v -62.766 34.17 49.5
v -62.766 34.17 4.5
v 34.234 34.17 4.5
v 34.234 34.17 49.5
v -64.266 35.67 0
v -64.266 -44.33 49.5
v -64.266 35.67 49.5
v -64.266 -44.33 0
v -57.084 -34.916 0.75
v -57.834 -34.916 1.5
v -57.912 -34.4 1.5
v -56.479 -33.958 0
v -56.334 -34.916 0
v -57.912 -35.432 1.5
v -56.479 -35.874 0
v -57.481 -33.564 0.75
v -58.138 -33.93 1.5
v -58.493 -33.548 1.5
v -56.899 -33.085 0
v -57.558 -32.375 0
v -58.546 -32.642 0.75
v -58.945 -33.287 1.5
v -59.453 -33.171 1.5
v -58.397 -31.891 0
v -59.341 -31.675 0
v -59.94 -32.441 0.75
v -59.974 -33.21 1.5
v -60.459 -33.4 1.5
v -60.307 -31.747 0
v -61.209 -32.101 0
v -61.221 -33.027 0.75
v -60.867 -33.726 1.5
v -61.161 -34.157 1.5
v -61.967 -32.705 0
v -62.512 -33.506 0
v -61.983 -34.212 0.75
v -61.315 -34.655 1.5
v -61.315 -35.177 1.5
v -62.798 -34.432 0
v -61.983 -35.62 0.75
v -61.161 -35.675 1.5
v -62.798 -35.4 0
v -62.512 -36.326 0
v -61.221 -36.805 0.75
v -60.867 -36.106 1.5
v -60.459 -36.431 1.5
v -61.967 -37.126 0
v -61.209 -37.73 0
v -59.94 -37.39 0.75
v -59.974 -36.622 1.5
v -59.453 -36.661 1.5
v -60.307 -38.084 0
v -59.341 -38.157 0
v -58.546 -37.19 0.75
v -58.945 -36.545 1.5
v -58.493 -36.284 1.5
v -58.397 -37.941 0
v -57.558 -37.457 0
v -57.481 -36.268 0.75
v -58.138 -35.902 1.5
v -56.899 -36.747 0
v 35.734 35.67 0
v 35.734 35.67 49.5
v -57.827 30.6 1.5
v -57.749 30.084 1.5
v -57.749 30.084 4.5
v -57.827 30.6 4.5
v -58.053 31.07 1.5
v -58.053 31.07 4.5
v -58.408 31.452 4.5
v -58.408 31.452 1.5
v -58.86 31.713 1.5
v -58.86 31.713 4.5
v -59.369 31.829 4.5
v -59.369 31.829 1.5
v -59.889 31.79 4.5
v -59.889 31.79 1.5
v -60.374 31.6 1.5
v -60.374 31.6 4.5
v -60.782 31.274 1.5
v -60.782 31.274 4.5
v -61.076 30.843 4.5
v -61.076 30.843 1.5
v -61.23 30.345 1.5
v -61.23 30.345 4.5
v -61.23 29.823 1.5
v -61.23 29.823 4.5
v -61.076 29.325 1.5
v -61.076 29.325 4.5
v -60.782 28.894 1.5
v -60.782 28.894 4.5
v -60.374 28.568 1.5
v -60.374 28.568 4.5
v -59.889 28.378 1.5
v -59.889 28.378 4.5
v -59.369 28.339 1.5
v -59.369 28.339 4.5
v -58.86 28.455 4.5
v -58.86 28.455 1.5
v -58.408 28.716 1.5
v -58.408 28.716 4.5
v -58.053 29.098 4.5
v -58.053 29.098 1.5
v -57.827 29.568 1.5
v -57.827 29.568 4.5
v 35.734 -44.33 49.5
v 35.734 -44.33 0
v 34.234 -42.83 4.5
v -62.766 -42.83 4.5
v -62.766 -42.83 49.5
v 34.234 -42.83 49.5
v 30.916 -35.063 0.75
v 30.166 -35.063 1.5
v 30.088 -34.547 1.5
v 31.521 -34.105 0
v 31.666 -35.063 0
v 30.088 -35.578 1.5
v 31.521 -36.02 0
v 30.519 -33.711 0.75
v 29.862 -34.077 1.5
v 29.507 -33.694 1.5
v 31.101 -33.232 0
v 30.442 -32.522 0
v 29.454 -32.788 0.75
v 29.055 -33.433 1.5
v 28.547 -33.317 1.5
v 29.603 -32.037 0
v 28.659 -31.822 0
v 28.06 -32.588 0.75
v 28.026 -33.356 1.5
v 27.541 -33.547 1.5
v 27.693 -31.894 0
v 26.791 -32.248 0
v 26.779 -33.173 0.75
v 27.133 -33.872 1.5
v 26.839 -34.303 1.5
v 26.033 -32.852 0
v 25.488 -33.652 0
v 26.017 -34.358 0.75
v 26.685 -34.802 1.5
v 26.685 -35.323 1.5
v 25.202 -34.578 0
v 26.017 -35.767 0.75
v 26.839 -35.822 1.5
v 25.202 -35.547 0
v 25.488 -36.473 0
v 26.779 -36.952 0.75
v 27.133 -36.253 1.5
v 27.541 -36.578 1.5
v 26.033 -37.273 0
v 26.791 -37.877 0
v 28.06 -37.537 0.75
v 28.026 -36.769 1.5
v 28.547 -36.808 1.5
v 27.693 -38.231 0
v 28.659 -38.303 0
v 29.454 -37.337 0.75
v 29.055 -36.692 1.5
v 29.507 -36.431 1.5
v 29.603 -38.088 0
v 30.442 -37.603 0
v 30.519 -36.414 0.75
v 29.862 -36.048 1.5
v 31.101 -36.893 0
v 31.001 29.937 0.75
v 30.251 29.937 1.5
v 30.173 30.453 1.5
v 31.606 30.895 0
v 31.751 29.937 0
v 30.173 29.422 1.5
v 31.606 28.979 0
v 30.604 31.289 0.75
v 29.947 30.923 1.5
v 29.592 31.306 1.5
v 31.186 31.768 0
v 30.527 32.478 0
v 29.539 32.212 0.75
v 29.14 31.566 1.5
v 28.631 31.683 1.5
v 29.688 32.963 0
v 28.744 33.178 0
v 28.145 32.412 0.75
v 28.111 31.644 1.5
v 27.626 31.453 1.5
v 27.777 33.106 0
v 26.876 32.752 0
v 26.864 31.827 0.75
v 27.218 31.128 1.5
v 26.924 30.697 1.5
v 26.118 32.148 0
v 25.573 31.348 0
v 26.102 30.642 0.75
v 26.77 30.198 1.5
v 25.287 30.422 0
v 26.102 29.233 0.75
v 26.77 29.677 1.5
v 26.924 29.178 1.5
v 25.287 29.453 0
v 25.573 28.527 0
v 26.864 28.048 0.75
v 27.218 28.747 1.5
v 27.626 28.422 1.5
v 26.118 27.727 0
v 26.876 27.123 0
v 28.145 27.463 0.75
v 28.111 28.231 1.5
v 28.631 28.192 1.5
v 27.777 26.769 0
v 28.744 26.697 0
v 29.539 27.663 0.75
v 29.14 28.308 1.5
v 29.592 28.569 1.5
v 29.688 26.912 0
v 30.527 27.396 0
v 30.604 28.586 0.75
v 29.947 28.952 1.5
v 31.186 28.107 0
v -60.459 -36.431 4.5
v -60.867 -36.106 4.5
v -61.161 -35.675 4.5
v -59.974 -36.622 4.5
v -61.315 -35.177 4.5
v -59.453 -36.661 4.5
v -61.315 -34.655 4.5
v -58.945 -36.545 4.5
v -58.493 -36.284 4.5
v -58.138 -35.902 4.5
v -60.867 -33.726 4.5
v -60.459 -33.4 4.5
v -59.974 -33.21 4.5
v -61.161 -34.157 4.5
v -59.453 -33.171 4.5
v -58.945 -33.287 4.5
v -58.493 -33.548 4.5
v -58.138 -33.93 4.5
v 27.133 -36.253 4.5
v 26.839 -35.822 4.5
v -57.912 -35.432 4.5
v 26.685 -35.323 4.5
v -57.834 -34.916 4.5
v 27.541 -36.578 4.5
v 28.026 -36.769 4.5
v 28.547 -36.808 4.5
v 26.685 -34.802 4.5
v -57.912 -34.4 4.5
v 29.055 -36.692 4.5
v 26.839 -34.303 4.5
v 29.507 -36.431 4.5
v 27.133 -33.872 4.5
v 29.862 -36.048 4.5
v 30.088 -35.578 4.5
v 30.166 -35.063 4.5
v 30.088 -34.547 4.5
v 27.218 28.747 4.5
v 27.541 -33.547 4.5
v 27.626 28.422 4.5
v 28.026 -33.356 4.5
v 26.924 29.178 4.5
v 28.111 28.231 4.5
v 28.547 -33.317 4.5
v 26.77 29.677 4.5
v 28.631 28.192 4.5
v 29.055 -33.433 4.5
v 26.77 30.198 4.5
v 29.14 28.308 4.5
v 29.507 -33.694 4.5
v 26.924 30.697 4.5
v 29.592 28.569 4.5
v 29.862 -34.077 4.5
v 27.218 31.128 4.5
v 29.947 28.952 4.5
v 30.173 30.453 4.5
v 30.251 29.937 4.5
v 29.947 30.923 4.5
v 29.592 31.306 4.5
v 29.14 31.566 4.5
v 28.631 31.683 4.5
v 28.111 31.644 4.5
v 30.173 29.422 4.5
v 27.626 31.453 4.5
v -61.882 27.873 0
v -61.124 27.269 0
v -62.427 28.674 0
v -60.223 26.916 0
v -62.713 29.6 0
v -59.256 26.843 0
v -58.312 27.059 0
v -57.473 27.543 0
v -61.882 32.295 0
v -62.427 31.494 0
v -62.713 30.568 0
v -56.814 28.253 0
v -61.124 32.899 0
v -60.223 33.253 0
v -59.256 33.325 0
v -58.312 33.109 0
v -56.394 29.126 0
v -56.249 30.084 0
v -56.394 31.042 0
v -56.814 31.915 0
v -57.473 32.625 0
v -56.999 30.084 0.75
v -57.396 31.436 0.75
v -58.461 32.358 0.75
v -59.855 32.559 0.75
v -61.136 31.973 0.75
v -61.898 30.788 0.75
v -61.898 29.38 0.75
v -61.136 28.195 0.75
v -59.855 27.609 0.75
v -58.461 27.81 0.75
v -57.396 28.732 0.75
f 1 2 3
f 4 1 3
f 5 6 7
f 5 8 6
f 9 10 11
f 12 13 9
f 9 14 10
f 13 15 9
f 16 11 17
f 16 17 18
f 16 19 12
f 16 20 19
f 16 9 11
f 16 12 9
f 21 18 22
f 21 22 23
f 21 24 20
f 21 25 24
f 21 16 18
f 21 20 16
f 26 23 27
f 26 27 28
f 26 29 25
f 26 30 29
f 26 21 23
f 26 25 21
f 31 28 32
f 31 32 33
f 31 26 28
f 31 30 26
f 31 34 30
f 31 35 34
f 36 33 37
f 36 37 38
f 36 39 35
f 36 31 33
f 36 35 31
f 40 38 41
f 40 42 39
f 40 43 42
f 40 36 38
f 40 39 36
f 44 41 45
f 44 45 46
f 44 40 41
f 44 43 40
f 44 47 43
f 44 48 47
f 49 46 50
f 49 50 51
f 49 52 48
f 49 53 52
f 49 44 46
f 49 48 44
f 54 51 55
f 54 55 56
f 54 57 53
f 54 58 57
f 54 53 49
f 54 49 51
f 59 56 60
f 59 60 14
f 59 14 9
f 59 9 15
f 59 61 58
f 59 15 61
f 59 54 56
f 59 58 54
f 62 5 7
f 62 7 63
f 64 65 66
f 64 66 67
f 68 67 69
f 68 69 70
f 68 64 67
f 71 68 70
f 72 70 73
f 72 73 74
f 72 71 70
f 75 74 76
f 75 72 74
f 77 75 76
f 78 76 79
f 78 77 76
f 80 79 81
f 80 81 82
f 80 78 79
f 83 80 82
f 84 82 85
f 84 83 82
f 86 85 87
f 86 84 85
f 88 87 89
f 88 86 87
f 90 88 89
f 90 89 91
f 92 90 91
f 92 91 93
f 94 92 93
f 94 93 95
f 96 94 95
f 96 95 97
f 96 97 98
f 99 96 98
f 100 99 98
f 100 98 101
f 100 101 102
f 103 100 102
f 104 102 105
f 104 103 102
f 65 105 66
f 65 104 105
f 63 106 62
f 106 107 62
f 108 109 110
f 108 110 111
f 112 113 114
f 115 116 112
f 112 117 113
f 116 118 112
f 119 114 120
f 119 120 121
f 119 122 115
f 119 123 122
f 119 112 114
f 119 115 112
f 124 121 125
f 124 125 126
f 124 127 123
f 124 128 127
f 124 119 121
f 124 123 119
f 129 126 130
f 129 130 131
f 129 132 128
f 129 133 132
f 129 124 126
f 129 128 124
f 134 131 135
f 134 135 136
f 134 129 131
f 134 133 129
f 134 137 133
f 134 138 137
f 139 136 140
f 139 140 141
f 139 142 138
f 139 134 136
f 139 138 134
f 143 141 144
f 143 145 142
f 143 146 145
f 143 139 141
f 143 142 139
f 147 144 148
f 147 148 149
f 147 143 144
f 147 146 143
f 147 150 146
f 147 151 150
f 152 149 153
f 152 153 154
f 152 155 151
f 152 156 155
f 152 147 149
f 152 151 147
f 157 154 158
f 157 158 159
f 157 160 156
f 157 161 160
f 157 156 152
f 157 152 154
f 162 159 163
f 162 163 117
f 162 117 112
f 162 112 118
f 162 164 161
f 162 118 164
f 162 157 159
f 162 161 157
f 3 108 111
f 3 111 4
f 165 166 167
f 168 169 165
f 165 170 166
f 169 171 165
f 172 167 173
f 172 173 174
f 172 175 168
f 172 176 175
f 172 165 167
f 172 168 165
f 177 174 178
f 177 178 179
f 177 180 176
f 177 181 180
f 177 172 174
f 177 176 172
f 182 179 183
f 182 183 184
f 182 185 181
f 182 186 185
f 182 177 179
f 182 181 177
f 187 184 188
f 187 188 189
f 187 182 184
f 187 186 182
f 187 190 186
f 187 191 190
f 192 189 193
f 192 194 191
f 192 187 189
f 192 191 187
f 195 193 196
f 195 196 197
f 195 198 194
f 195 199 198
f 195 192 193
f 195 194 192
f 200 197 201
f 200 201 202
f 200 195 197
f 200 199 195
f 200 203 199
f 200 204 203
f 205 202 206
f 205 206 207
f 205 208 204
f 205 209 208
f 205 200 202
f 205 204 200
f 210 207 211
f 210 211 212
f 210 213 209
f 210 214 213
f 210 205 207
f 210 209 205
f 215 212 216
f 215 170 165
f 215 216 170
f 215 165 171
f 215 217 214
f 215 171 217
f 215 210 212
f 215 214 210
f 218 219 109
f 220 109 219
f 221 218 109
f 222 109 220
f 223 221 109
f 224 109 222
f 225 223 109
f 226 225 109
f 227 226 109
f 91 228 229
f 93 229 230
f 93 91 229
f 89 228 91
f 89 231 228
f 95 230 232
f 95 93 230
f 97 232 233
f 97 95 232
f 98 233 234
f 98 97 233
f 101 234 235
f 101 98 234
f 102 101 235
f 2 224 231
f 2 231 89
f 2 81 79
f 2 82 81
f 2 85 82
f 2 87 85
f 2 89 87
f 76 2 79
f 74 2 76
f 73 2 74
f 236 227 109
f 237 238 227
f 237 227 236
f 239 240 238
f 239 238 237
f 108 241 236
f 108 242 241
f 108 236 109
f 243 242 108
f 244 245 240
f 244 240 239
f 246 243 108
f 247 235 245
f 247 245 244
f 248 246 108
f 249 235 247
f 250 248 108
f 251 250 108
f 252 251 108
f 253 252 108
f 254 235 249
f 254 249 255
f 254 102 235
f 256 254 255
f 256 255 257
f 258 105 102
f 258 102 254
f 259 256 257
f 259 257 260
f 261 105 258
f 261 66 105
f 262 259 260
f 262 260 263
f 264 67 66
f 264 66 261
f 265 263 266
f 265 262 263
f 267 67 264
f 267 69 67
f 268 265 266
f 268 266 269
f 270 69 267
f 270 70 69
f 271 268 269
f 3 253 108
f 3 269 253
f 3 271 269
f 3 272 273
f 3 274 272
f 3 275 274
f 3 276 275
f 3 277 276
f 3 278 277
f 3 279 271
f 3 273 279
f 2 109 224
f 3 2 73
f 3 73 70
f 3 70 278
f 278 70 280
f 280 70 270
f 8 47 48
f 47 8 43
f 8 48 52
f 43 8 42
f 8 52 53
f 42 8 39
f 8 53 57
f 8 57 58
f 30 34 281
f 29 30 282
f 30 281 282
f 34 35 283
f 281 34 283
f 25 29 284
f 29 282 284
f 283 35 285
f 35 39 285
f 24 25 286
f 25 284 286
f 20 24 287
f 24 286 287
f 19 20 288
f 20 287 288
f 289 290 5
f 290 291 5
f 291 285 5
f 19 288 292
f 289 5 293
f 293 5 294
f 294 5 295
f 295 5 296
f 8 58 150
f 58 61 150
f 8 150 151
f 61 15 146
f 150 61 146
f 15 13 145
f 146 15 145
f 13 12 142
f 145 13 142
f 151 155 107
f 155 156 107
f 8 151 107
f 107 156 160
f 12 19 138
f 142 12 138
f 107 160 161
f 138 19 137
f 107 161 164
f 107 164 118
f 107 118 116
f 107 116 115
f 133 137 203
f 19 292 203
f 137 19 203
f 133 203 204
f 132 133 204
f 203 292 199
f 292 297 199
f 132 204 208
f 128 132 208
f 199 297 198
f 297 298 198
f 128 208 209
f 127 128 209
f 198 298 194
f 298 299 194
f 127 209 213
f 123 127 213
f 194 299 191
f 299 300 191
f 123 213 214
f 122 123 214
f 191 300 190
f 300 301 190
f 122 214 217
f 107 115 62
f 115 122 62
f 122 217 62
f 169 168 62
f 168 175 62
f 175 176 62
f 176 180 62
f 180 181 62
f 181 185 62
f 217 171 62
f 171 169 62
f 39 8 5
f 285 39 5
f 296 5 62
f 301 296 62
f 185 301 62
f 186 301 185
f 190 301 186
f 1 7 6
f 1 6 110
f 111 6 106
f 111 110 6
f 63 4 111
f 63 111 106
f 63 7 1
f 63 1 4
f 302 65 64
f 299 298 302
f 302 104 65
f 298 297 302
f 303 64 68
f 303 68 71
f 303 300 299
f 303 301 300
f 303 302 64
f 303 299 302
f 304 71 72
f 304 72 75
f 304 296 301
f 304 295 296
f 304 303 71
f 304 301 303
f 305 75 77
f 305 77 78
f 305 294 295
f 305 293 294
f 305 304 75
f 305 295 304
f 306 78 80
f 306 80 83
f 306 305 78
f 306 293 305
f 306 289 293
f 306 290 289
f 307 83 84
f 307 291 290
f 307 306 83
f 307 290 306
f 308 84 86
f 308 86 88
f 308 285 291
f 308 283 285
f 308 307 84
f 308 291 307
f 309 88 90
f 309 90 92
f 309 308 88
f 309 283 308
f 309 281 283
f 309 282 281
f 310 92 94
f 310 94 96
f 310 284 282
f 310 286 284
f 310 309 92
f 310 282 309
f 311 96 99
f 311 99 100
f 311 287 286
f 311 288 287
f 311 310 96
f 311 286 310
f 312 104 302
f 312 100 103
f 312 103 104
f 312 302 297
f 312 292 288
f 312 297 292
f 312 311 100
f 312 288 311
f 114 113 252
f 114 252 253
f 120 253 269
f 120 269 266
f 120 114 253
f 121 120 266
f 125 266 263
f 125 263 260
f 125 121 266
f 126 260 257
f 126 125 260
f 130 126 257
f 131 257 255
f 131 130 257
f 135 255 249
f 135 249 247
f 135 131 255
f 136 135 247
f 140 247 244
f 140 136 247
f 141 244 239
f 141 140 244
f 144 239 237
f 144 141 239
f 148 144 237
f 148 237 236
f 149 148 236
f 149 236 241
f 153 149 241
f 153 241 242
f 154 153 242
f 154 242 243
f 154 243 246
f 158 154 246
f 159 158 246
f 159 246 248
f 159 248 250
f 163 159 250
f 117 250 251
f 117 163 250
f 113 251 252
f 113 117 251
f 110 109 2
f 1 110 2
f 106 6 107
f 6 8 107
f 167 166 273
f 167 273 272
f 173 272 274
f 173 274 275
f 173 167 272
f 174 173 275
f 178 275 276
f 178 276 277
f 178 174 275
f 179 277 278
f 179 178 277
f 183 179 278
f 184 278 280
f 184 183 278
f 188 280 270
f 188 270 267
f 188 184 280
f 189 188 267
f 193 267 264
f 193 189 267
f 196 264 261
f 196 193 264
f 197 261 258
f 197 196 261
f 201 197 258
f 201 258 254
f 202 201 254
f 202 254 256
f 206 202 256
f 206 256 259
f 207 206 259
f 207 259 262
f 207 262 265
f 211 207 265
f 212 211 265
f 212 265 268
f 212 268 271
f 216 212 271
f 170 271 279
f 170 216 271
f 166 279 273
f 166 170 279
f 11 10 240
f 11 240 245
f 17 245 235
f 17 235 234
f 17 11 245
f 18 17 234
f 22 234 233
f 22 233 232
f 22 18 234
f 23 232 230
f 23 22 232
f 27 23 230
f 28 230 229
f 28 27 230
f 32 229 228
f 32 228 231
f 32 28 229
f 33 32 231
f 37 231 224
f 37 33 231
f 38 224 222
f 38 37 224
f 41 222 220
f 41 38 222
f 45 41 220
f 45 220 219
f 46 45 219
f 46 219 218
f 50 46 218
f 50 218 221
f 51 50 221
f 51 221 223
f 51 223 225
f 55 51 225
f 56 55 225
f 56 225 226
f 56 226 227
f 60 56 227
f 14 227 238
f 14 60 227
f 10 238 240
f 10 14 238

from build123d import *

# Parameters (mm, degrees)
SKETCH004_W     = 100
SKETCH004_H     = 80
SKETCH004_R     = 1.75
PAD003_DEPTH    = 4.5
CHAMFER001_SIZE = 1.5
SKETCH003_W     = 100
SKETCH003_H     = 80
SKETCH003_W_2   = 97
SKETCH003_H_2   = 77
PAD002_DEPTH    = 45


with BuildPart() as part:
    # Sketch004 → Pad003 (new body)
    with BuildSketch(Plane.XY):
        with Locations((-14.266246, -4.330319)):
            Rectangle(SKETCH004_W, SKETCH004_H)
        with Locations((-59.499317, 30.08403)):
            Circle(SKETCH004_R, mode=Mode.SUBTRACT)
        with Locations((28.500683, 29.937424)):
            Circle(SKETCH004_R, mode=Mode.SUBTRACT)
        with Locations((-59.584126, -34.915915)):
            Circle(SKETCH004_R, mode=Mode.SUBTRACT)
        with Locations((28.415874, -35.062521)):
            Circle(SKETCH004_R, mode=Mode.SUBTRACT)
    extrude(amount=PAD003_DEPTH)

    # Chamfer001
    chamfer001_edges = [part.edges().sort_by_distance(p)[0] for p in [
        (-61.334126, -34.915915, 0),
        (26.665874, -35.062521, 0),
        (26.750683, 29.937424, 0),
        (-61.249317, 30.08403, 0),
    ]]
    chamfer(chamfer001_edges, length=CHAMFER001_SIZE)

    # Sketch003 (on Face3 of Chamfer001) → Pad002 (join)
    with BuildSketch(Plane.XY.offset(4.5)):
        with Locations((-14.266246, -4.330319)):
            Rectangle(SKETCH003_W, SKETCH003_H)
        with Locations((-14.266246, -4.330319)):
            Rectangle(SKETCH003_W_2, SKETCH003_H_2, mode=Mode.SUBTRACT)
    extrude(amount=PAD002_DEPTH)


solid = part.part
